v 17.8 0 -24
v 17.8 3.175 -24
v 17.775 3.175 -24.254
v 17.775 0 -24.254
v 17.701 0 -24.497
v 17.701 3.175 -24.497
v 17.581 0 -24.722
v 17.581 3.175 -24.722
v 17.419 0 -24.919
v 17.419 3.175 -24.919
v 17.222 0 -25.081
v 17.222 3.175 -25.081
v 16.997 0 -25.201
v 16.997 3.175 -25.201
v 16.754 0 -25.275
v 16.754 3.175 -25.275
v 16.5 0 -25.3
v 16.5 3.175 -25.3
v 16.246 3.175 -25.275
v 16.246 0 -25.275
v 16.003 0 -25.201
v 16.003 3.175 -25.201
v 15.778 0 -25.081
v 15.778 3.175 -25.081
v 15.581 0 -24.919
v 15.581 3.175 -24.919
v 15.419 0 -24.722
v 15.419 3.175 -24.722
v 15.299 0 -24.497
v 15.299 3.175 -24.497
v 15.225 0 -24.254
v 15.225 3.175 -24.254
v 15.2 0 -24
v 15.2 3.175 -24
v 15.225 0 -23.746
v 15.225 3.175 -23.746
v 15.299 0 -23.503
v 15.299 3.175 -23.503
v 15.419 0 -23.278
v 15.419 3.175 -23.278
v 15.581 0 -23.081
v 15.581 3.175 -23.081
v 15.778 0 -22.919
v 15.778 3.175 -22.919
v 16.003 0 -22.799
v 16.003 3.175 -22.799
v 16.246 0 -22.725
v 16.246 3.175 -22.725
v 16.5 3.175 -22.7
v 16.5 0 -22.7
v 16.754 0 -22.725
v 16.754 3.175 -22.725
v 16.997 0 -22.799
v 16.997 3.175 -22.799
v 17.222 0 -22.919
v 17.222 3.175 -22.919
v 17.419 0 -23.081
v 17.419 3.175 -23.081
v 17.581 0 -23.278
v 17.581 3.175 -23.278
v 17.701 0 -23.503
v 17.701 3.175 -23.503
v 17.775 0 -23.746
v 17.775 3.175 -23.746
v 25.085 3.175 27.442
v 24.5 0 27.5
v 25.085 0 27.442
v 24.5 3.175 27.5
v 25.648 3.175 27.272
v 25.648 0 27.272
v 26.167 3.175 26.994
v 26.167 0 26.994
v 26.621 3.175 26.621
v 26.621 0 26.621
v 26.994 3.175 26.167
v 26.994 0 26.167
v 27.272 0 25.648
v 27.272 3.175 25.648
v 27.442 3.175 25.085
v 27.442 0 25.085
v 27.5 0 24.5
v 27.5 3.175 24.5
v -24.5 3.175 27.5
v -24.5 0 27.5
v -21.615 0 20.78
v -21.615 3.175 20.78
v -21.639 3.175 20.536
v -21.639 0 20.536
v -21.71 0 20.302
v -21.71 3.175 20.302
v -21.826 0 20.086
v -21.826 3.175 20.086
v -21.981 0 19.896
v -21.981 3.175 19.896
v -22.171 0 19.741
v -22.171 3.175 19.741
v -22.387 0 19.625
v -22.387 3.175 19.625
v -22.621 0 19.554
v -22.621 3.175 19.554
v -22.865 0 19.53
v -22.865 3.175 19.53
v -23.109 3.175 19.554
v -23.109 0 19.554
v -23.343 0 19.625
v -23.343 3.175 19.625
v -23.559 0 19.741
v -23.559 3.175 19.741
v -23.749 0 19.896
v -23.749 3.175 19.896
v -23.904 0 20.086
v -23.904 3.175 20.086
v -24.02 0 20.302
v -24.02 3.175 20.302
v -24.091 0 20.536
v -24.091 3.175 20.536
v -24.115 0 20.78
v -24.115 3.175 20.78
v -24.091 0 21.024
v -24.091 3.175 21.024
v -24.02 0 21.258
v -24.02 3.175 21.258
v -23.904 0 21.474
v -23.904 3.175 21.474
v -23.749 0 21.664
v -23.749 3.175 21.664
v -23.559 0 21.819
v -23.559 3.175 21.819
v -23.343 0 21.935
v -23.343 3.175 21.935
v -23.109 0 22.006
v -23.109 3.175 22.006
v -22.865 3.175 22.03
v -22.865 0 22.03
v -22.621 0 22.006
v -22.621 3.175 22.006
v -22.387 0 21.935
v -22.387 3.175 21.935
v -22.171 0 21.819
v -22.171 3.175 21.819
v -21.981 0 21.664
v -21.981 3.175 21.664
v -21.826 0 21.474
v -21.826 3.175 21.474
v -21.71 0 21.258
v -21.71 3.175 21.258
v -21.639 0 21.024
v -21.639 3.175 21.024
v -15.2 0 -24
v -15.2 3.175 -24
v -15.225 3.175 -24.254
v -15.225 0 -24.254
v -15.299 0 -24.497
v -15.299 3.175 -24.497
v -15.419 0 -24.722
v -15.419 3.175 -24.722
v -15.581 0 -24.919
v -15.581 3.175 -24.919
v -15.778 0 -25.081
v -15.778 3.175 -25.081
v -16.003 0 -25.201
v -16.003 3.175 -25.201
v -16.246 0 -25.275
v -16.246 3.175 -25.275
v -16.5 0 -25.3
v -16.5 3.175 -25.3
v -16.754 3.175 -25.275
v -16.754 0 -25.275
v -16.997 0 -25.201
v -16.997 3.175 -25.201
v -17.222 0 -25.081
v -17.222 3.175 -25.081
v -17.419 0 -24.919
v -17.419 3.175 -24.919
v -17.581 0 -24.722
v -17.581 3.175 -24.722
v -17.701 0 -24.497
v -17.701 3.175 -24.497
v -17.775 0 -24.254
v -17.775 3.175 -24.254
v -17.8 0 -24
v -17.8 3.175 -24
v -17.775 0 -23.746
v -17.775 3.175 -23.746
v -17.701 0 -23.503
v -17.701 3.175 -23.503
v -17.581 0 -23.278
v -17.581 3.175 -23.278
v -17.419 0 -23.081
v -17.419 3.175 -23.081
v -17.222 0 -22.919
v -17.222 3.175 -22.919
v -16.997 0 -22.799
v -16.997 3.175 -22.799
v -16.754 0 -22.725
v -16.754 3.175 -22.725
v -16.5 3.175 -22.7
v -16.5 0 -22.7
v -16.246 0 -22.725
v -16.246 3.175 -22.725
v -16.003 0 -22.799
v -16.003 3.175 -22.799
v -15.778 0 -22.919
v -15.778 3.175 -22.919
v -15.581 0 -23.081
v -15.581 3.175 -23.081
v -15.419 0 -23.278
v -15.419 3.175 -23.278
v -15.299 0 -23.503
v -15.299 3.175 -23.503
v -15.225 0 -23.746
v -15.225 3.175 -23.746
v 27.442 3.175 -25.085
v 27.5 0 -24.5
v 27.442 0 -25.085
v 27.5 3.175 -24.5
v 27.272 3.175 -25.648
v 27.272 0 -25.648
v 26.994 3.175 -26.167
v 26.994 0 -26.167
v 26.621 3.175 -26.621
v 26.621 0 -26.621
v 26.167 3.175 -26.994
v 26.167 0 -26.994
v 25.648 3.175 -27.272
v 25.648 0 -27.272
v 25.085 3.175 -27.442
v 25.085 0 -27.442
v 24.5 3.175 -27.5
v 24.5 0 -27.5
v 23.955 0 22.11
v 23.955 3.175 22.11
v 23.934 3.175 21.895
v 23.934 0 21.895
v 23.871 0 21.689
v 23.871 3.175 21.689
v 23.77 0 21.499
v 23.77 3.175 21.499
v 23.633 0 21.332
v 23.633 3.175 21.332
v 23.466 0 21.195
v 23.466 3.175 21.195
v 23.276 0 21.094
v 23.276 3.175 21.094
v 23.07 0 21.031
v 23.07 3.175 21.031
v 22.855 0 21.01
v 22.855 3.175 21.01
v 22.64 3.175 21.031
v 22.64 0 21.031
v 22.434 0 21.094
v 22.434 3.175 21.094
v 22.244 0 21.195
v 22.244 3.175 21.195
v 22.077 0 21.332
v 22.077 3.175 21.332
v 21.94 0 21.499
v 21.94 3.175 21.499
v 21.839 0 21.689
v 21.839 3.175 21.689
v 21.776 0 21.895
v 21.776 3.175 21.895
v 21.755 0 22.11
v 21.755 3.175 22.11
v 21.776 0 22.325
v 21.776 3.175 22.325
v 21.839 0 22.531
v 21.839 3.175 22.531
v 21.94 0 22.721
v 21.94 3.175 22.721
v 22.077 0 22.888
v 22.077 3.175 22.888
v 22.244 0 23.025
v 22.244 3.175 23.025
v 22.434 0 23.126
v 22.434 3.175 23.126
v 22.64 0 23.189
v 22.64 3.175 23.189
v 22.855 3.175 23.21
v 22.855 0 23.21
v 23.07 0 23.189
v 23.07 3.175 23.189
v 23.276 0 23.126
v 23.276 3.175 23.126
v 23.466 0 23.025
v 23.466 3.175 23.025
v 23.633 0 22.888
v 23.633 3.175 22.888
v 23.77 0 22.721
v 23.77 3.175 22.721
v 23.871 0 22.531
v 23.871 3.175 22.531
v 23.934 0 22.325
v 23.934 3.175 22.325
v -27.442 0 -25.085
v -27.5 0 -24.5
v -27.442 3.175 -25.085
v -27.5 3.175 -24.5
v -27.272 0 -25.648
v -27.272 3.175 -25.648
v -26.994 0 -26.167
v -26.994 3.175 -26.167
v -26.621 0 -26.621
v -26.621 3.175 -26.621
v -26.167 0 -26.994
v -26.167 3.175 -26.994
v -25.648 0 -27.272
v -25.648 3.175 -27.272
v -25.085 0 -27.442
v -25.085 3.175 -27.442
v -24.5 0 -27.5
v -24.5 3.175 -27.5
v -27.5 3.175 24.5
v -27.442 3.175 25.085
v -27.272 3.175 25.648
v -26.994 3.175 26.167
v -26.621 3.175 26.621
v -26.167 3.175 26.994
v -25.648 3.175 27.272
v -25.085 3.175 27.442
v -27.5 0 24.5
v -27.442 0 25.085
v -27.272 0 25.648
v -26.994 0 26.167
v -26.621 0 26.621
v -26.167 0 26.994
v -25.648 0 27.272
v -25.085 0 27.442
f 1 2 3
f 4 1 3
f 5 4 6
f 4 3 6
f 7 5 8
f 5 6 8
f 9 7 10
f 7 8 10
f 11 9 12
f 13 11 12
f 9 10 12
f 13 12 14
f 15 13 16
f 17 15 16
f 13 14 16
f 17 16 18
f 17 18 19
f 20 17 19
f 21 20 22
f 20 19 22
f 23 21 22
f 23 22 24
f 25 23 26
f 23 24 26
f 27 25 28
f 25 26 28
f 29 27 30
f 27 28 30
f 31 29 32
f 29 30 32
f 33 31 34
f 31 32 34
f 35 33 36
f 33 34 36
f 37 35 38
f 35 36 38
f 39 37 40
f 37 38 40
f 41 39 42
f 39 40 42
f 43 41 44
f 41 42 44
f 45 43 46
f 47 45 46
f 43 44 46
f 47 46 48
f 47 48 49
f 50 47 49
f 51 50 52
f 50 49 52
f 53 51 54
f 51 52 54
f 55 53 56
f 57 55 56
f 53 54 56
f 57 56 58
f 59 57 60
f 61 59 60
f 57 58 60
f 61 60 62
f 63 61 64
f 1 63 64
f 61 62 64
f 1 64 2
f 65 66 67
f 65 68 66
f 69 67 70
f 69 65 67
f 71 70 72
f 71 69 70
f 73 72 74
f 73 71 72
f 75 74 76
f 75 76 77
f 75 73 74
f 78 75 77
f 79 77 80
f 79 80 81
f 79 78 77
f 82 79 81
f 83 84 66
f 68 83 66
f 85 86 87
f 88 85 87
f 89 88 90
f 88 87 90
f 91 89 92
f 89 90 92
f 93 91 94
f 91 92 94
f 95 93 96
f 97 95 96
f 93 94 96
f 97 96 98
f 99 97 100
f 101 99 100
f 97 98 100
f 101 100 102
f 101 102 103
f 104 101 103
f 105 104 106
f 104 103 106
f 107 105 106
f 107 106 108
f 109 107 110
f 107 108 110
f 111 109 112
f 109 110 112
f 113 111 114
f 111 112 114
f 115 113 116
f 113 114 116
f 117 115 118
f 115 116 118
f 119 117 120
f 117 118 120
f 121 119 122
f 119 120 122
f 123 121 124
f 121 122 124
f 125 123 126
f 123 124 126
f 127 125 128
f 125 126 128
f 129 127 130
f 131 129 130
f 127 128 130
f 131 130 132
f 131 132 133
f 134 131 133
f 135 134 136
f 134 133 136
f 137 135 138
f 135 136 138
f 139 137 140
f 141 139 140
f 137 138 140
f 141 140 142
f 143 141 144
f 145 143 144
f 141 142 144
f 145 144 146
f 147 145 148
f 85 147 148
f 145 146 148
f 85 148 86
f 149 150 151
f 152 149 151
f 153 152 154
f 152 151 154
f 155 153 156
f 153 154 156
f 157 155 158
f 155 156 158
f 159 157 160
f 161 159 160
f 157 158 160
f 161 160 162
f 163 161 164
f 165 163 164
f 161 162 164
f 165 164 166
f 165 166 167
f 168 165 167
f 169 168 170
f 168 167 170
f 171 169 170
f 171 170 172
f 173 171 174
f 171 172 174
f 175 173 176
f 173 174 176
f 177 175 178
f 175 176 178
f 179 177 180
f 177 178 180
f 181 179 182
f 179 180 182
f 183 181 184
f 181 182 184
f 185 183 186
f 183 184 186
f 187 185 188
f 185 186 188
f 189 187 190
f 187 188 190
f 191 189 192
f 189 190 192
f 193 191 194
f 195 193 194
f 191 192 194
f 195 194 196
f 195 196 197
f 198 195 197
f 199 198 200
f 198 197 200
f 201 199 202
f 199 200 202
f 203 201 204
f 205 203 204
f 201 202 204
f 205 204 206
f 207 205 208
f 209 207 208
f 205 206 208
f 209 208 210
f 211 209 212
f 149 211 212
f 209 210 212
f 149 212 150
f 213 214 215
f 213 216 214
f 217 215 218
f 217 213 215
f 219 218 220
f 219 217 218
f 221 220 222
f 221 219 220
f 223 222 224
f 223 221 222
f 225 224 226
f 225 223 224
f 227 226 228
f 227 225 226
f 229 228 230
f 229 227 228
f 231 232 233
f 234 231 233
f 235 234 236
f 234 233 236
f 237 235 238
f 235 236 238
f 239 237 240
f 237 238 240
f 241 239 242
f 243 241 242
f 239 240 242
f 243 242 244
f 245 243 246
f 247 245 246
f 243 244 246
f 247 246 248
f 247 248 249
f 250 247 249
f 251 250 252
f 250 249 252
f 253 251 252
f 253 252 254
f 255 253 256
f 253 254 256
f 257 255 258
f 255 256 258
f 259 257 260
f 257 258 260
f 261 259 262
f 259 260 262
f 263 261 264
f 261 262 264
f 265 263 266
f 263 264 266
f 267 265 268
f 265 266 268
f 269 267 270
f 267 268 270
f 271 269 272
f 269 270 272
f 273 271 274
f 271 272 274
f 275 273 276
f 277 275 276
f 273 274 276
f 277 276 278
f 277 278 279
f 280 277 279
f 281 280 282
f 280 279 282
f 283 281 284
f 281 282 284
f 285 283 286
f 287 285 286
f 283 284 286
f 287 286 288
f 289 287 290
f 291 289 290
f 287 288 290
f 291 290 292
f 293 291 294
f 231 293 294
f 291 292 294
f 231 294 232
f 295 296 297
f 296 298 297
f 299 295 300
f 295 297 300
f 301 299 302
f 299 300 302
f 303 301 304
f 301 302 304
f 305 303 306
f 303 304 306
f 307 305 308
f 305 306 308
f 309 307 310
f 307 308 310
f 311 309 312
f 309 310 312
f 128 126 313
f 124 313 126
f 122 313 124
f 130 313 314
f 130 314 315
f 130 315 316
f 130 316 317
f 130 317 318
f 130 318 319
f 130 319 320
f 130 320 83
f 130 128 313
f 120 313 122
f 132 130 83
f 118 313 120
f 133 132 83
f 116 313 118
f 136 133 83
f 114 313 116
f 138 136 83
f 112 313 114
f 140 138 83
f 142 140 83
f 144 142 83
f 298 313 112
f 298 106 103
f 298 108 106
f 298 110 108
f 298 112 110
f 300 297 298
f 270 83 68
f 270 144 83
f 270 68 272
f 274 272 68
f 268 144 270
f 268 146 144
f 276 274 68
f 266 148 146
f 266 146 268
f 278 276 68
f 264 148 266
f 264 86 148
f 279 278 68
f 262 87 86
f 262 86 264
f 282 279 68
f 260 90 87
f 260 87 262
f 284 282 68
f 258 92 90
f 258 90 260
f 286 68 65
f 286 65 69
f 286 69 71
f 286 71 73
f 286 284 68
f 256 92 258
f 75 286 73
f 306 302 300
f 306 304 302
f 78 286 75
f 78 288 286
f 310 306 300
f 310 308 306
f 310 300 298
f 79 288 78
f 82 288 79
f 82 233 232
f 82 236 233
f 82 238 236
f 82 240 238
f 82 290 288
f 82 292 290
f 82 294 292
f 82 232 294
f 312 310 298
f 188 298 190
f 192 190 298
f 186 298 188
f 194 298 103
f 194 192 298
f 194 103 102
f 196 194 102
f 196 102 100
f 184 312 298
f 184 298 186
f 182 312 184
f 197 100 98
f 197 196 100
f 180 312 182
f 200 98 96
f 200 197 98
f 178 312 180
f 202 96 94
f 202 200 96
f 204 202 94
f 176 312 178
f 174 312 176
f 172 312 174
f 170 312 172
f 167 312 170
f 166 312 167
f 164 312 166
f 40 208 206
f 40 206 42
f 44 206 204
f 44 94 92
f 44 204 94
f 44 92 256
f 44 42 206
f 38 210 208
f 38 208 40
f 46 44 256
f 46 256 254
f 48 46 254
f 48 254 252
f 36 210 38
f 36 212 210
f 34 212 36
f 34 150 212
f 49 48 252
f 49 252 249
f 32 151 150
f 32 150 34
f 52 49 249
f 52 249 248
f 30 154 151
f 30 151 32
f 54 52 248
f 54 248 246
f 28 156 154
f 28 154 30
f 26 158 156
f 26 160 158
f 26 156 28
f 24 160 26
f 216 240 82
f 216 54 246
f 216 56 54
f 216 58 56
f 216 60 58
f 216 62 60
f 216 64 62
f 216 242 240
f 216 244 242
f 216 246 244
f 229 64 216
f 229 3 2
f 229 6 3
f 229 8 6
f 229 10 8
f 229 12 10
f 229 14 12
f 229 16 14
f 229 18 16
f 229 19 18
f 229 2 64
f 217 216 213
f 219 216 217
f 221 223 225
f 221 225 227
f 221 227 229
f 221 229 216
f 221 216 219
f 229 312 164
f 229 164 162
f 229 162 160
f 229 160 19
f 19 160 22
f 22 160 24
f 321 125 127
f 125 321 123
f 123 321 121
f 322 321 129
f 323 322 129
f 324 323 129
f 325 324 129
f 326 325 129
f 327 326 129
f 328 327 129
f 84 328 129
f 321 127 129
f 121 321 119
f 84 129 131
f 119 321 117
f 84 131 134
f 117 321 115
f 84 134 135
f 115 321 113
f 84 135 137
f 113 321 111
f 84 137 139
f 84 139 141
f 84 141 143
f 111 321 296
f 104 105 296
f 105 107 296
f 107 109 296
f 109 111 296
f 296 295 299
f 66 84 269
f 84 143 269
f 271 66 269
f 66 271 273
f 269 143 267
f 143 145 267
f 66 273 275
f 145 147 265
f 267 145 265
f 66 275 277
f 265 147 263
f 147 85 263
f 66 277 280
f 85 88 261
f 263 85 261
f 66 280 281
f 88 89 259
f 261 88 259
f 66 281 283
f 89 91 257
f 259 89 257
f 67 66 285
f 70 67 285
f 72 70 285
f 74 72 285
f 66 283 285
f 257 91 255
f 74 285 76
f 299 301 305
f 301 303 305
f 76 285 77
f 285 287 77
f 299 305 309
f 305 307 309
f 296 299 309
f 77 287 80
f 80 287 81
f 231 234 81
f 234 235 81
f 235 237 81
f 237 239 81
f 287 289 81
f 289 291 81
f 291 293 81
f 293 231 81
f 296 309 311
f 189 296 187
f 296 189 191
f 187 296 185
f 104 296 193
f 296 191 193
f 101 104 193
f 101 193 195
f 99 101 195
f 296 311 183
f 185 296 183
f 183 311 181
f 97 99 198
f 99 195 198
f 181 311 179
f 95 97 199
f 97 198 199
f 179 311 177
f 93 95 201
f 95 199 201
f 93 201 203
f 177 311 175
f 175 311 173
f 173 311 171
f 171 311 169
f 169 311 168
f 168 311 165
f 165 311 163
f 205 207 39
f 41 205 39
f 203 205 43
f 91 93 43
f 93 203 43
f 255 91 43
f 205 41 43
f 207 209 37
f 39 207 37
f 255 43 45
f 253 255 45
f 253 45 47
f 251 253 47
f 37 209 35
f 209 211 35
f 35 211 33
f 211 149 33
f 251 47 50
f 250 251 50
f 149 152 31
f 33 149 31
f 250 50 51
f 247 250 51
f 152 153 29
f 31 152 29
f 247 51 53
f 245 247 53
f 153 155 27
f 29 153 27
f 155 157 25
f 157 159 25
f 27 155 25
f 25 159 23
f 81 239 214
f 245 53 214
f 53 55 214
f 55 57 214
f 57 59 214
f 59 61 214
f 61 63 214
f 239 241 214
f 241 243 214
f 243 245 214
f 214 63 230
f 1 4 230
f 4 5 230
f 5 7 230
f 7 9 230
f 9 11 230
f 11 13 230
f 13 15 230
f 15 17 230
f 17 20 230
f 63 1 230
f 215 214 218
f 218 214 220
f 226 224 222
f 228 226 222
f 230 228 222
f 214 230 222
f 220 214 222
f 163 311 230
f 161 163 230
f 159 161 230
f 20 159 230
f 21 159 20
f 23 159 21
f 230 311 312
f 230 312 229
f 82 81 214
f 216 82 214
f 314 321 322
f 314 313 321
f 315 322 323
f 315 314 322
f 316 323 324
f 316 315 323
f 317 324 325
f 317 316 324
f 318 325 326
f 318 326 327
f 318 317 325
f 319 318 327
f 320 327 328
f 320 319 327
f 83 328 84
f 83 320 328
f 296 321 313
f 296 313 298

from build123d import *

# Parameters (mm, degrees)
SKETCH1_W           = 55
SKETCH1_H           = 55
BOSS_EXTRUDE1_DEPTH = 3.175
FILLET1_R           = 3
SKETCH3_R           = 1.1
SKETCH3_R_2         = 1.25
CUT_EXTRUDE2_DEPTH  = 3.175
SKETCH6_R           = 1.3
CUT_EXTRUDE5_DEPTH  = 3.175


with BuildPart() as part:
    # Sketch1 → Boss-Extrude1 (new body)
    with BuildSketch(Plane(origin=(0, 0, 0), x_dir=(1, 0, 0), z_dir=(0, 1, 0))):
        Rectangle(SKETCH1_W, SKETCH1_H)
    extrude(amount=BOSS_EXTRUDE1_DEPTH)

    # Fillet1
    fillet1_edges = [part.edges().sort_by_distance(p)[0] for p in [
        (27.5, 1.5875, 27.5),
        (-27.5, 1.5875, 27.5),
        (-27.5, 1.5875, -27.5),
        (27.5, 1.5875, -27.5),
    ]]
    fillet(fillet1_edges, radius=FILLET1_R)

    # Sketch3 → Cut-Extrude2 (cut)
    with BuildSketch(Plane(origin=(0, 3.175, 0), x_dir=(1, 0, 0), z_dir=(0, 1, 0))):
        with Locations((22.855, -22.11)):
            Circle(SKETCH3_R)
        with Locations((-22.865, -20.78)):
            Circle(SKETCH3_R_2)
    extrude(amount=-CUT_EXTRUDE2_DEPTH, mode=Mode.SUBTRACT)

    # Sketch6 → Cut-Extrude5 (cut)
    with BuildSketch(Plane(origin=(0, 3.175, 0), x_dir=(1, 0, 0), z_dir=(0, 1, 0))):
        with Locations((-16.5, 24)):
            Circle(SKETCH6_R)
        with Locations((16.5, 24)):
            Circle(SKETCH6_R)
    extrude(amount=-CUT_EXTRUDE5_DEPTH, mode=Mode.SUBTRACT)


solid = part.part
